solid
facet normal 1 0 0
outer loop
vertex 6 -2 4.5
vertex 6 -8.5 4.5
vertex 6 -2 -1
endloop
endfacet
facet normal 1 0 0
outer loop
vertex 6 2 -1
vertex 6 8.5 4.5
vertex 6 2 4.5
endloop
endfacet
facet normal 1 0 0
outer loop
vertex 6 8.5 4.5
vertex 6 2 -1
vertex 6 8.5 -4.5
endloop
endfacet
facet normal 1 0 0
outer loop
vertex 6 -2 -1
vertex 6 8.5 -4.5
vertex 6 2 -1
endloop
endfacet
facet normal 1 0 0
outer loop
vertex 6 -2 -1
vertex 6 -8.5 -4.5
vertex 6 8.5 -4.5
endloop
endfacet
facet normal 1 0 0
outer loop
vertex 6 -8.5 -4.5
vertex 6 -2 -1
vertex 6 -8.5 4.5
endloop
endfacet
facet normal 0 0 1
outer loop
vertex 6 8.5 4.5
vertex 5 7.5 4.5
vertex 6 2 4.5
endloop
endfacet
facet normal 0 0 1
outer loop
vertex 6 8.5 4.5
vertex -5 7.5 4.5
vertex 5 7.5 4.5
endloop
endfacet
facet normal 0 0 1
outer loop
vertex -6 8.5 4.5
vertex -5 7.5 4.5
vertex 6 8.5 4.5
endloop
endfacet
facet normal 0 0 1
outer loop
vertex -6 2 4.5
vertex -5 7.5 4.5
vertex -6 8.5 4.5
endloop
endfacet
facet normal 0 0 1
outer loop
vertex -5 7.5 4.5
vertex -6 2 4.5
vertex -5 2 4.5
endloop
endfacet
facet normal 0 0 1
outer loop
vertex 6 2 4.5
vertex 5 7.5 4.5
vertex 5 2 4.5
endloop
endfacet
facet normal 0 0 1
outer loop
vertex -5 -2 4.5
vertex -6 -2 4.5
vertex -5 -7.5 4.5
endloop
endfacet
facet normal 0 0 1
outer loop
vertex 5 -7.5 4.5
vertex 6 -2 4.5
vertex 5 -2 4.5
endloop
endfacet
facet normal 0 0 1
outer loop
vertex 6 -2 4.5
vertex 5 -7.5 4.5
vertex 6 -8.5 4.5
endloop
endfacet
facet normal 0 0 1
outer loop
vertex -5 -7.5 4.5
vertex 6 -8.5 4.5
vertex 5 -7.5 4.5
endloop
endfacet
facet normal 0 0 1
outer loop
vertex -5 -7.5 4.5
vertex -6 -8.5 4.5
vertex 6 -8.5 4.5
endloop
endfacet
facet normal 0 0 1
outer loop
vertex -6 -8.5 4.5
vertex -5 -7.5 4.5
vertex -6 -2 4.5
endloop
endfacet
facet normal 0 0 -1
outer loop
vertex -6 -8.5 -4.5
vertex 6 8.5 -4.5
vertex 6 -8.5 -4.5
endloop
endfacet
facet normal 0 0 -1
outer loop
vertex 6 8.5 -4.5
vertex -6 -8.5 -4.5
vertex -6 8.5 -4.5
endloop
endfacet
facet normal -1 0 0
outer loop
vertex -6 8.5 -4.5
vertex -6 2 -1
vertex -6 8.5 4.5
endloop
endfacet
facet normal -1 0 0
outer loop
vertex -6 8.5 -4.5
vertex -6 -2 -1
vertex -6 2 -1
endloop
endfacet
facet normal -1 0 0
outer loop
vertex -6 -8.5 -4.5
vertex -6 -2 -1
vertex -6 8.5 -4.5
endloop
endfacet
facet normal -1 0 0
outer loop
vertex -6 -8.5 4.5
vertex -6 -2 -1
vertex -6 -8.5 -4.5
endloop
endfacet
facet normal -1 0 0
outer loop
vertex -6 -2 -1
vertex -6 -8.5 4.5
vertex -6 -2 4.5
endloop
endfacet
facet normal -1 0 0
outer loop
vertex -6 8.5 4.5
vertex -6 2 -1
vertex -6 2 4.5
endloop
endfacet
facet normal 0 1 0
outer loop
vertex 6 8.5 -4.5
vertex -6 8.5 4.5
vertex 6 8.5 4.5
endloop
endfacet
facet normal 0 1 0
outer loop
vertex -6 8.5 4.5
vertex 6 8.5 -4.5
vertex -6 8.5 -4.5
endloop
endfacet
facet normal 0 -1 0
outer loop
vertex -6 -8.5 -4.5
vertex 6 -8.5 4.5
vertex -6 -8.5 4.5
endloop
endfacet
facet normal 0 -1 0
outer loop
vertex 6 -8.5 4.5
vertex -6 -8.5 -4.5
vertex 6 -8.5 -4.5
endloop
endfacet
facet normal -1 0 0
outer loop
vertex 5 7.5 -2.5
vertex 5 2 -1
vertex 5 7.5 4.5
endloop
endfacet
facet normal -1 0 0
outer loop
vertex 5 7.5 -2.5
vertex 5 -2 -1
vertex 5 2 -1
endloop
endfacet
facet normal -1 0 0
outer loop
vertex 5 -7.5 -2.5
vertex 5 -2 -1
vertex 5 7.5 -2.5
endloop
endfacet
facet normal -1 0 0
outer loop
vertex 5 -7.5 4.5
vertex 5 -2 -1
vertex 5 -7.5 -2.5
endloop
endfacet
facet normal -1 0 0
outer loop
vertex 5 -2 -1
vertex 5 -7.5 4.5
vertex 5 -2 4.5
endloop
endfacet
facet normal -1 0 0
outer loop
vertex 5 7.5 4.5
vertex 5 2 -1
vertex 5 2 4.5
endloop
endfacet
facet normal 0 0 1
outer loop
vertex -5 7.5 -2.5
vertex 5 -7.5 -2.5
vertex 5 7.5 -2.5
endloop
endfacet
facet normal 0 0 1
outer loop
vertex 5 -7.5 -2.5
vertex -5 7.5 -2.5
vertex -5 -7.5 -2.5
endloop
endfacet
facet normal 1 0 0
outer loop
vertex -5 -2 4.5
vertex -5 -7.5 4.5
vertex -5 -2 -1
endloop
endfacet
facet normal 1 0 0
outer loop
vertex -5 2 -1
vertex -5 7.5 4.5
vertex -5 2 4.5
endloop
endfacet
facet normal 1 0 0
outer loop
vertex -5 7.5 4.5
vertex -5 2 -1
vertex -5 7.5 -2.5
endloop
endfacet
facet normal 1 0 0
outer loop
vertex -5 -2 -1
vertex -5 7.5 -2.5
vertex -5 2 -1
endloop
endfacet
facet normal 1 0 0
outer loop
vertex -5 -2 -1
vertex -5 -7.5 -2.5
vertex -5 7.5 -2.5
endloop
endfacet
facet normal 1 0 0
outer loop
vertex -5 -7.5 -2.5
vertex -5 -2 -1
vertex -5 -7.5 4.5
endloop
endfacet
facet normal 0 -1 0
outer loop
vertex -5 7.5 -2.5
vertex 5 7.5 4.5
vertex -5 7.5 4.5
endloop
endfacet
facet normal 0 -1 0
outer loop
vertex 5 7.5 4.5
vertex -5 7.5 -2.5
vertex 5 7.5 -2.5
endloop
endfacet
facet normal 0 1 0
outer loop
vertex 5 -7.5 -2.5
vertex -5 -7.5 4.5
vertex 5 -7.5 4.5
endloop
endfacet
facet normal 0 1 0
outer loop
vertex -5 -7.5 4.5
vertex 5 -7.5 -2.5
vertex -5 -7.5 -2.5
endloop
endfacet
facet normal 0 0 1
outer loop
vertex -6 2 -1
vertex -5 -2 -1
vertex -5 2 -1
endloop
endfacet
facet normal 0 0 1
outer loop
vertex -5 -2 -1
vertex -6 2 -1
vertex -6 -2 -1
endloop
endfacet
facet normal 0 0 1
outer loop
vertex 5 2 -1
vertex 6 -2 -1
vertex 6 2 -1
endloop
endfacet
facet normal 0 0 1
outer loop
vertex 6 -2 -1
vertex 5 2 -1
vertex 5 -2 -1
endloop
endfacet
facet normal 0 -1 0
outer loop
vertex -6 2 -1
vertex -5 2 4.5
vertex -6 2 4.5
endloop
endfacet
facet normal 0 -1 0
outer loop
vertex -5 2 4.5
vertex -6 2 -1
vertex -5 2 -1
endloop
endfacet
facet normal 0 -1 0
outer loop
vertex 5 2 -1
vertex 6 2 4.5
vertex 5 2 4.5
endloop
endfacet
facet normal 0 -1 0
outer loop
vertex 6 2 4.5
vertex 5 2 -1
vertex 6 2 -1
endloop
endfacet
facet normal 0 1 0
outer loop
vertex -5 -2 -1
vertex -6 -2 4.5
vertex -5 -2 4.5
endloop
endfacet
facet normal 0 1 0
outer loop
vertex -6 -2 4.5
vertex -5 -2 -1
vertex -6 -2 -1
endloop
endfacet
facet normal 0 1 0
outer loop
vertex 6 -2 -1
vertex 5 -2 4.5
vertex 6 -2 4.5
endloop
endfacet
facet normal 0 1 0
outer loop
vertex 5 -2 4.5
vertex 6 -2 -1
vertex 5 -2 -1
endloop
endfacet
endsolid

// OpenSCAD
// file: cololight_tribute_header.scad
/* 
Cololight like hexagon lights
*/

/* 
variable definitions
*/

hex_height=25;
hex_lon_d=86;
hex_short_d=74.478;
hex_incir_rad=43;
hex_lip_depth=1;
diffuser_thickness=2;
diffuser_lip_width=0;
diffuser_edge_thickness=1;
diffuser_clip_thickness=4;
diffuser_clip_wall_thickness=1;
base_thickness=1;
edge_thickness=2;
pin_header_width=8;
pin_header_height=2.5;
clip_mouth_width=12;
clip_mouth_length=6.5;
clip_edge_offset=4.3;

clip_width=12;
clip_length=(2*clip_mouth_length)+(2*edge_thickness);
clip_height=8+base_thickness;
// main file
/*
cololight tribute hexagonal light clip
*/

/* 
Cololight like hexagon lights
*/

include <cololight_tribute_header.scad>

/*
hex_height=25;
hex_lon_d=86;
hex_short_d=74.478;
hex_incir_rad=43;
diffuser_thickness=2;
base_thickness=1;
edge_thickness=2;
pin_header_width=8;
pin_header_height=2.5;
clip_mouth_width=12;
clip_mouth_length=6.5;
clip_edge_offset=4.3;

clip_width=12;
clip_length=(2*clip_mouth_length)+(2*edge_thickness);
clip_height=8+base_thickness;
*/ 
/* 
clip definition
*/
    

//translate([0,hex_short_d/2,-11.75]){
group() {
    difference(){
        difference(){
            cube( size=[clip_width,clip_length,clip_height], center=true);

            translate([0,0,edge_thickness]){
                cube( size=[clip_width-edge_thickness,clip_length-edge_thickness,clip_height], center=true);
            }
        }
        
        translate([0,0,base_thickness+pin_header_height]){
            cube( size=[clip_width+2,edge_thickness*2,clip_height], center=true);
            }
            }
            
}
//}
